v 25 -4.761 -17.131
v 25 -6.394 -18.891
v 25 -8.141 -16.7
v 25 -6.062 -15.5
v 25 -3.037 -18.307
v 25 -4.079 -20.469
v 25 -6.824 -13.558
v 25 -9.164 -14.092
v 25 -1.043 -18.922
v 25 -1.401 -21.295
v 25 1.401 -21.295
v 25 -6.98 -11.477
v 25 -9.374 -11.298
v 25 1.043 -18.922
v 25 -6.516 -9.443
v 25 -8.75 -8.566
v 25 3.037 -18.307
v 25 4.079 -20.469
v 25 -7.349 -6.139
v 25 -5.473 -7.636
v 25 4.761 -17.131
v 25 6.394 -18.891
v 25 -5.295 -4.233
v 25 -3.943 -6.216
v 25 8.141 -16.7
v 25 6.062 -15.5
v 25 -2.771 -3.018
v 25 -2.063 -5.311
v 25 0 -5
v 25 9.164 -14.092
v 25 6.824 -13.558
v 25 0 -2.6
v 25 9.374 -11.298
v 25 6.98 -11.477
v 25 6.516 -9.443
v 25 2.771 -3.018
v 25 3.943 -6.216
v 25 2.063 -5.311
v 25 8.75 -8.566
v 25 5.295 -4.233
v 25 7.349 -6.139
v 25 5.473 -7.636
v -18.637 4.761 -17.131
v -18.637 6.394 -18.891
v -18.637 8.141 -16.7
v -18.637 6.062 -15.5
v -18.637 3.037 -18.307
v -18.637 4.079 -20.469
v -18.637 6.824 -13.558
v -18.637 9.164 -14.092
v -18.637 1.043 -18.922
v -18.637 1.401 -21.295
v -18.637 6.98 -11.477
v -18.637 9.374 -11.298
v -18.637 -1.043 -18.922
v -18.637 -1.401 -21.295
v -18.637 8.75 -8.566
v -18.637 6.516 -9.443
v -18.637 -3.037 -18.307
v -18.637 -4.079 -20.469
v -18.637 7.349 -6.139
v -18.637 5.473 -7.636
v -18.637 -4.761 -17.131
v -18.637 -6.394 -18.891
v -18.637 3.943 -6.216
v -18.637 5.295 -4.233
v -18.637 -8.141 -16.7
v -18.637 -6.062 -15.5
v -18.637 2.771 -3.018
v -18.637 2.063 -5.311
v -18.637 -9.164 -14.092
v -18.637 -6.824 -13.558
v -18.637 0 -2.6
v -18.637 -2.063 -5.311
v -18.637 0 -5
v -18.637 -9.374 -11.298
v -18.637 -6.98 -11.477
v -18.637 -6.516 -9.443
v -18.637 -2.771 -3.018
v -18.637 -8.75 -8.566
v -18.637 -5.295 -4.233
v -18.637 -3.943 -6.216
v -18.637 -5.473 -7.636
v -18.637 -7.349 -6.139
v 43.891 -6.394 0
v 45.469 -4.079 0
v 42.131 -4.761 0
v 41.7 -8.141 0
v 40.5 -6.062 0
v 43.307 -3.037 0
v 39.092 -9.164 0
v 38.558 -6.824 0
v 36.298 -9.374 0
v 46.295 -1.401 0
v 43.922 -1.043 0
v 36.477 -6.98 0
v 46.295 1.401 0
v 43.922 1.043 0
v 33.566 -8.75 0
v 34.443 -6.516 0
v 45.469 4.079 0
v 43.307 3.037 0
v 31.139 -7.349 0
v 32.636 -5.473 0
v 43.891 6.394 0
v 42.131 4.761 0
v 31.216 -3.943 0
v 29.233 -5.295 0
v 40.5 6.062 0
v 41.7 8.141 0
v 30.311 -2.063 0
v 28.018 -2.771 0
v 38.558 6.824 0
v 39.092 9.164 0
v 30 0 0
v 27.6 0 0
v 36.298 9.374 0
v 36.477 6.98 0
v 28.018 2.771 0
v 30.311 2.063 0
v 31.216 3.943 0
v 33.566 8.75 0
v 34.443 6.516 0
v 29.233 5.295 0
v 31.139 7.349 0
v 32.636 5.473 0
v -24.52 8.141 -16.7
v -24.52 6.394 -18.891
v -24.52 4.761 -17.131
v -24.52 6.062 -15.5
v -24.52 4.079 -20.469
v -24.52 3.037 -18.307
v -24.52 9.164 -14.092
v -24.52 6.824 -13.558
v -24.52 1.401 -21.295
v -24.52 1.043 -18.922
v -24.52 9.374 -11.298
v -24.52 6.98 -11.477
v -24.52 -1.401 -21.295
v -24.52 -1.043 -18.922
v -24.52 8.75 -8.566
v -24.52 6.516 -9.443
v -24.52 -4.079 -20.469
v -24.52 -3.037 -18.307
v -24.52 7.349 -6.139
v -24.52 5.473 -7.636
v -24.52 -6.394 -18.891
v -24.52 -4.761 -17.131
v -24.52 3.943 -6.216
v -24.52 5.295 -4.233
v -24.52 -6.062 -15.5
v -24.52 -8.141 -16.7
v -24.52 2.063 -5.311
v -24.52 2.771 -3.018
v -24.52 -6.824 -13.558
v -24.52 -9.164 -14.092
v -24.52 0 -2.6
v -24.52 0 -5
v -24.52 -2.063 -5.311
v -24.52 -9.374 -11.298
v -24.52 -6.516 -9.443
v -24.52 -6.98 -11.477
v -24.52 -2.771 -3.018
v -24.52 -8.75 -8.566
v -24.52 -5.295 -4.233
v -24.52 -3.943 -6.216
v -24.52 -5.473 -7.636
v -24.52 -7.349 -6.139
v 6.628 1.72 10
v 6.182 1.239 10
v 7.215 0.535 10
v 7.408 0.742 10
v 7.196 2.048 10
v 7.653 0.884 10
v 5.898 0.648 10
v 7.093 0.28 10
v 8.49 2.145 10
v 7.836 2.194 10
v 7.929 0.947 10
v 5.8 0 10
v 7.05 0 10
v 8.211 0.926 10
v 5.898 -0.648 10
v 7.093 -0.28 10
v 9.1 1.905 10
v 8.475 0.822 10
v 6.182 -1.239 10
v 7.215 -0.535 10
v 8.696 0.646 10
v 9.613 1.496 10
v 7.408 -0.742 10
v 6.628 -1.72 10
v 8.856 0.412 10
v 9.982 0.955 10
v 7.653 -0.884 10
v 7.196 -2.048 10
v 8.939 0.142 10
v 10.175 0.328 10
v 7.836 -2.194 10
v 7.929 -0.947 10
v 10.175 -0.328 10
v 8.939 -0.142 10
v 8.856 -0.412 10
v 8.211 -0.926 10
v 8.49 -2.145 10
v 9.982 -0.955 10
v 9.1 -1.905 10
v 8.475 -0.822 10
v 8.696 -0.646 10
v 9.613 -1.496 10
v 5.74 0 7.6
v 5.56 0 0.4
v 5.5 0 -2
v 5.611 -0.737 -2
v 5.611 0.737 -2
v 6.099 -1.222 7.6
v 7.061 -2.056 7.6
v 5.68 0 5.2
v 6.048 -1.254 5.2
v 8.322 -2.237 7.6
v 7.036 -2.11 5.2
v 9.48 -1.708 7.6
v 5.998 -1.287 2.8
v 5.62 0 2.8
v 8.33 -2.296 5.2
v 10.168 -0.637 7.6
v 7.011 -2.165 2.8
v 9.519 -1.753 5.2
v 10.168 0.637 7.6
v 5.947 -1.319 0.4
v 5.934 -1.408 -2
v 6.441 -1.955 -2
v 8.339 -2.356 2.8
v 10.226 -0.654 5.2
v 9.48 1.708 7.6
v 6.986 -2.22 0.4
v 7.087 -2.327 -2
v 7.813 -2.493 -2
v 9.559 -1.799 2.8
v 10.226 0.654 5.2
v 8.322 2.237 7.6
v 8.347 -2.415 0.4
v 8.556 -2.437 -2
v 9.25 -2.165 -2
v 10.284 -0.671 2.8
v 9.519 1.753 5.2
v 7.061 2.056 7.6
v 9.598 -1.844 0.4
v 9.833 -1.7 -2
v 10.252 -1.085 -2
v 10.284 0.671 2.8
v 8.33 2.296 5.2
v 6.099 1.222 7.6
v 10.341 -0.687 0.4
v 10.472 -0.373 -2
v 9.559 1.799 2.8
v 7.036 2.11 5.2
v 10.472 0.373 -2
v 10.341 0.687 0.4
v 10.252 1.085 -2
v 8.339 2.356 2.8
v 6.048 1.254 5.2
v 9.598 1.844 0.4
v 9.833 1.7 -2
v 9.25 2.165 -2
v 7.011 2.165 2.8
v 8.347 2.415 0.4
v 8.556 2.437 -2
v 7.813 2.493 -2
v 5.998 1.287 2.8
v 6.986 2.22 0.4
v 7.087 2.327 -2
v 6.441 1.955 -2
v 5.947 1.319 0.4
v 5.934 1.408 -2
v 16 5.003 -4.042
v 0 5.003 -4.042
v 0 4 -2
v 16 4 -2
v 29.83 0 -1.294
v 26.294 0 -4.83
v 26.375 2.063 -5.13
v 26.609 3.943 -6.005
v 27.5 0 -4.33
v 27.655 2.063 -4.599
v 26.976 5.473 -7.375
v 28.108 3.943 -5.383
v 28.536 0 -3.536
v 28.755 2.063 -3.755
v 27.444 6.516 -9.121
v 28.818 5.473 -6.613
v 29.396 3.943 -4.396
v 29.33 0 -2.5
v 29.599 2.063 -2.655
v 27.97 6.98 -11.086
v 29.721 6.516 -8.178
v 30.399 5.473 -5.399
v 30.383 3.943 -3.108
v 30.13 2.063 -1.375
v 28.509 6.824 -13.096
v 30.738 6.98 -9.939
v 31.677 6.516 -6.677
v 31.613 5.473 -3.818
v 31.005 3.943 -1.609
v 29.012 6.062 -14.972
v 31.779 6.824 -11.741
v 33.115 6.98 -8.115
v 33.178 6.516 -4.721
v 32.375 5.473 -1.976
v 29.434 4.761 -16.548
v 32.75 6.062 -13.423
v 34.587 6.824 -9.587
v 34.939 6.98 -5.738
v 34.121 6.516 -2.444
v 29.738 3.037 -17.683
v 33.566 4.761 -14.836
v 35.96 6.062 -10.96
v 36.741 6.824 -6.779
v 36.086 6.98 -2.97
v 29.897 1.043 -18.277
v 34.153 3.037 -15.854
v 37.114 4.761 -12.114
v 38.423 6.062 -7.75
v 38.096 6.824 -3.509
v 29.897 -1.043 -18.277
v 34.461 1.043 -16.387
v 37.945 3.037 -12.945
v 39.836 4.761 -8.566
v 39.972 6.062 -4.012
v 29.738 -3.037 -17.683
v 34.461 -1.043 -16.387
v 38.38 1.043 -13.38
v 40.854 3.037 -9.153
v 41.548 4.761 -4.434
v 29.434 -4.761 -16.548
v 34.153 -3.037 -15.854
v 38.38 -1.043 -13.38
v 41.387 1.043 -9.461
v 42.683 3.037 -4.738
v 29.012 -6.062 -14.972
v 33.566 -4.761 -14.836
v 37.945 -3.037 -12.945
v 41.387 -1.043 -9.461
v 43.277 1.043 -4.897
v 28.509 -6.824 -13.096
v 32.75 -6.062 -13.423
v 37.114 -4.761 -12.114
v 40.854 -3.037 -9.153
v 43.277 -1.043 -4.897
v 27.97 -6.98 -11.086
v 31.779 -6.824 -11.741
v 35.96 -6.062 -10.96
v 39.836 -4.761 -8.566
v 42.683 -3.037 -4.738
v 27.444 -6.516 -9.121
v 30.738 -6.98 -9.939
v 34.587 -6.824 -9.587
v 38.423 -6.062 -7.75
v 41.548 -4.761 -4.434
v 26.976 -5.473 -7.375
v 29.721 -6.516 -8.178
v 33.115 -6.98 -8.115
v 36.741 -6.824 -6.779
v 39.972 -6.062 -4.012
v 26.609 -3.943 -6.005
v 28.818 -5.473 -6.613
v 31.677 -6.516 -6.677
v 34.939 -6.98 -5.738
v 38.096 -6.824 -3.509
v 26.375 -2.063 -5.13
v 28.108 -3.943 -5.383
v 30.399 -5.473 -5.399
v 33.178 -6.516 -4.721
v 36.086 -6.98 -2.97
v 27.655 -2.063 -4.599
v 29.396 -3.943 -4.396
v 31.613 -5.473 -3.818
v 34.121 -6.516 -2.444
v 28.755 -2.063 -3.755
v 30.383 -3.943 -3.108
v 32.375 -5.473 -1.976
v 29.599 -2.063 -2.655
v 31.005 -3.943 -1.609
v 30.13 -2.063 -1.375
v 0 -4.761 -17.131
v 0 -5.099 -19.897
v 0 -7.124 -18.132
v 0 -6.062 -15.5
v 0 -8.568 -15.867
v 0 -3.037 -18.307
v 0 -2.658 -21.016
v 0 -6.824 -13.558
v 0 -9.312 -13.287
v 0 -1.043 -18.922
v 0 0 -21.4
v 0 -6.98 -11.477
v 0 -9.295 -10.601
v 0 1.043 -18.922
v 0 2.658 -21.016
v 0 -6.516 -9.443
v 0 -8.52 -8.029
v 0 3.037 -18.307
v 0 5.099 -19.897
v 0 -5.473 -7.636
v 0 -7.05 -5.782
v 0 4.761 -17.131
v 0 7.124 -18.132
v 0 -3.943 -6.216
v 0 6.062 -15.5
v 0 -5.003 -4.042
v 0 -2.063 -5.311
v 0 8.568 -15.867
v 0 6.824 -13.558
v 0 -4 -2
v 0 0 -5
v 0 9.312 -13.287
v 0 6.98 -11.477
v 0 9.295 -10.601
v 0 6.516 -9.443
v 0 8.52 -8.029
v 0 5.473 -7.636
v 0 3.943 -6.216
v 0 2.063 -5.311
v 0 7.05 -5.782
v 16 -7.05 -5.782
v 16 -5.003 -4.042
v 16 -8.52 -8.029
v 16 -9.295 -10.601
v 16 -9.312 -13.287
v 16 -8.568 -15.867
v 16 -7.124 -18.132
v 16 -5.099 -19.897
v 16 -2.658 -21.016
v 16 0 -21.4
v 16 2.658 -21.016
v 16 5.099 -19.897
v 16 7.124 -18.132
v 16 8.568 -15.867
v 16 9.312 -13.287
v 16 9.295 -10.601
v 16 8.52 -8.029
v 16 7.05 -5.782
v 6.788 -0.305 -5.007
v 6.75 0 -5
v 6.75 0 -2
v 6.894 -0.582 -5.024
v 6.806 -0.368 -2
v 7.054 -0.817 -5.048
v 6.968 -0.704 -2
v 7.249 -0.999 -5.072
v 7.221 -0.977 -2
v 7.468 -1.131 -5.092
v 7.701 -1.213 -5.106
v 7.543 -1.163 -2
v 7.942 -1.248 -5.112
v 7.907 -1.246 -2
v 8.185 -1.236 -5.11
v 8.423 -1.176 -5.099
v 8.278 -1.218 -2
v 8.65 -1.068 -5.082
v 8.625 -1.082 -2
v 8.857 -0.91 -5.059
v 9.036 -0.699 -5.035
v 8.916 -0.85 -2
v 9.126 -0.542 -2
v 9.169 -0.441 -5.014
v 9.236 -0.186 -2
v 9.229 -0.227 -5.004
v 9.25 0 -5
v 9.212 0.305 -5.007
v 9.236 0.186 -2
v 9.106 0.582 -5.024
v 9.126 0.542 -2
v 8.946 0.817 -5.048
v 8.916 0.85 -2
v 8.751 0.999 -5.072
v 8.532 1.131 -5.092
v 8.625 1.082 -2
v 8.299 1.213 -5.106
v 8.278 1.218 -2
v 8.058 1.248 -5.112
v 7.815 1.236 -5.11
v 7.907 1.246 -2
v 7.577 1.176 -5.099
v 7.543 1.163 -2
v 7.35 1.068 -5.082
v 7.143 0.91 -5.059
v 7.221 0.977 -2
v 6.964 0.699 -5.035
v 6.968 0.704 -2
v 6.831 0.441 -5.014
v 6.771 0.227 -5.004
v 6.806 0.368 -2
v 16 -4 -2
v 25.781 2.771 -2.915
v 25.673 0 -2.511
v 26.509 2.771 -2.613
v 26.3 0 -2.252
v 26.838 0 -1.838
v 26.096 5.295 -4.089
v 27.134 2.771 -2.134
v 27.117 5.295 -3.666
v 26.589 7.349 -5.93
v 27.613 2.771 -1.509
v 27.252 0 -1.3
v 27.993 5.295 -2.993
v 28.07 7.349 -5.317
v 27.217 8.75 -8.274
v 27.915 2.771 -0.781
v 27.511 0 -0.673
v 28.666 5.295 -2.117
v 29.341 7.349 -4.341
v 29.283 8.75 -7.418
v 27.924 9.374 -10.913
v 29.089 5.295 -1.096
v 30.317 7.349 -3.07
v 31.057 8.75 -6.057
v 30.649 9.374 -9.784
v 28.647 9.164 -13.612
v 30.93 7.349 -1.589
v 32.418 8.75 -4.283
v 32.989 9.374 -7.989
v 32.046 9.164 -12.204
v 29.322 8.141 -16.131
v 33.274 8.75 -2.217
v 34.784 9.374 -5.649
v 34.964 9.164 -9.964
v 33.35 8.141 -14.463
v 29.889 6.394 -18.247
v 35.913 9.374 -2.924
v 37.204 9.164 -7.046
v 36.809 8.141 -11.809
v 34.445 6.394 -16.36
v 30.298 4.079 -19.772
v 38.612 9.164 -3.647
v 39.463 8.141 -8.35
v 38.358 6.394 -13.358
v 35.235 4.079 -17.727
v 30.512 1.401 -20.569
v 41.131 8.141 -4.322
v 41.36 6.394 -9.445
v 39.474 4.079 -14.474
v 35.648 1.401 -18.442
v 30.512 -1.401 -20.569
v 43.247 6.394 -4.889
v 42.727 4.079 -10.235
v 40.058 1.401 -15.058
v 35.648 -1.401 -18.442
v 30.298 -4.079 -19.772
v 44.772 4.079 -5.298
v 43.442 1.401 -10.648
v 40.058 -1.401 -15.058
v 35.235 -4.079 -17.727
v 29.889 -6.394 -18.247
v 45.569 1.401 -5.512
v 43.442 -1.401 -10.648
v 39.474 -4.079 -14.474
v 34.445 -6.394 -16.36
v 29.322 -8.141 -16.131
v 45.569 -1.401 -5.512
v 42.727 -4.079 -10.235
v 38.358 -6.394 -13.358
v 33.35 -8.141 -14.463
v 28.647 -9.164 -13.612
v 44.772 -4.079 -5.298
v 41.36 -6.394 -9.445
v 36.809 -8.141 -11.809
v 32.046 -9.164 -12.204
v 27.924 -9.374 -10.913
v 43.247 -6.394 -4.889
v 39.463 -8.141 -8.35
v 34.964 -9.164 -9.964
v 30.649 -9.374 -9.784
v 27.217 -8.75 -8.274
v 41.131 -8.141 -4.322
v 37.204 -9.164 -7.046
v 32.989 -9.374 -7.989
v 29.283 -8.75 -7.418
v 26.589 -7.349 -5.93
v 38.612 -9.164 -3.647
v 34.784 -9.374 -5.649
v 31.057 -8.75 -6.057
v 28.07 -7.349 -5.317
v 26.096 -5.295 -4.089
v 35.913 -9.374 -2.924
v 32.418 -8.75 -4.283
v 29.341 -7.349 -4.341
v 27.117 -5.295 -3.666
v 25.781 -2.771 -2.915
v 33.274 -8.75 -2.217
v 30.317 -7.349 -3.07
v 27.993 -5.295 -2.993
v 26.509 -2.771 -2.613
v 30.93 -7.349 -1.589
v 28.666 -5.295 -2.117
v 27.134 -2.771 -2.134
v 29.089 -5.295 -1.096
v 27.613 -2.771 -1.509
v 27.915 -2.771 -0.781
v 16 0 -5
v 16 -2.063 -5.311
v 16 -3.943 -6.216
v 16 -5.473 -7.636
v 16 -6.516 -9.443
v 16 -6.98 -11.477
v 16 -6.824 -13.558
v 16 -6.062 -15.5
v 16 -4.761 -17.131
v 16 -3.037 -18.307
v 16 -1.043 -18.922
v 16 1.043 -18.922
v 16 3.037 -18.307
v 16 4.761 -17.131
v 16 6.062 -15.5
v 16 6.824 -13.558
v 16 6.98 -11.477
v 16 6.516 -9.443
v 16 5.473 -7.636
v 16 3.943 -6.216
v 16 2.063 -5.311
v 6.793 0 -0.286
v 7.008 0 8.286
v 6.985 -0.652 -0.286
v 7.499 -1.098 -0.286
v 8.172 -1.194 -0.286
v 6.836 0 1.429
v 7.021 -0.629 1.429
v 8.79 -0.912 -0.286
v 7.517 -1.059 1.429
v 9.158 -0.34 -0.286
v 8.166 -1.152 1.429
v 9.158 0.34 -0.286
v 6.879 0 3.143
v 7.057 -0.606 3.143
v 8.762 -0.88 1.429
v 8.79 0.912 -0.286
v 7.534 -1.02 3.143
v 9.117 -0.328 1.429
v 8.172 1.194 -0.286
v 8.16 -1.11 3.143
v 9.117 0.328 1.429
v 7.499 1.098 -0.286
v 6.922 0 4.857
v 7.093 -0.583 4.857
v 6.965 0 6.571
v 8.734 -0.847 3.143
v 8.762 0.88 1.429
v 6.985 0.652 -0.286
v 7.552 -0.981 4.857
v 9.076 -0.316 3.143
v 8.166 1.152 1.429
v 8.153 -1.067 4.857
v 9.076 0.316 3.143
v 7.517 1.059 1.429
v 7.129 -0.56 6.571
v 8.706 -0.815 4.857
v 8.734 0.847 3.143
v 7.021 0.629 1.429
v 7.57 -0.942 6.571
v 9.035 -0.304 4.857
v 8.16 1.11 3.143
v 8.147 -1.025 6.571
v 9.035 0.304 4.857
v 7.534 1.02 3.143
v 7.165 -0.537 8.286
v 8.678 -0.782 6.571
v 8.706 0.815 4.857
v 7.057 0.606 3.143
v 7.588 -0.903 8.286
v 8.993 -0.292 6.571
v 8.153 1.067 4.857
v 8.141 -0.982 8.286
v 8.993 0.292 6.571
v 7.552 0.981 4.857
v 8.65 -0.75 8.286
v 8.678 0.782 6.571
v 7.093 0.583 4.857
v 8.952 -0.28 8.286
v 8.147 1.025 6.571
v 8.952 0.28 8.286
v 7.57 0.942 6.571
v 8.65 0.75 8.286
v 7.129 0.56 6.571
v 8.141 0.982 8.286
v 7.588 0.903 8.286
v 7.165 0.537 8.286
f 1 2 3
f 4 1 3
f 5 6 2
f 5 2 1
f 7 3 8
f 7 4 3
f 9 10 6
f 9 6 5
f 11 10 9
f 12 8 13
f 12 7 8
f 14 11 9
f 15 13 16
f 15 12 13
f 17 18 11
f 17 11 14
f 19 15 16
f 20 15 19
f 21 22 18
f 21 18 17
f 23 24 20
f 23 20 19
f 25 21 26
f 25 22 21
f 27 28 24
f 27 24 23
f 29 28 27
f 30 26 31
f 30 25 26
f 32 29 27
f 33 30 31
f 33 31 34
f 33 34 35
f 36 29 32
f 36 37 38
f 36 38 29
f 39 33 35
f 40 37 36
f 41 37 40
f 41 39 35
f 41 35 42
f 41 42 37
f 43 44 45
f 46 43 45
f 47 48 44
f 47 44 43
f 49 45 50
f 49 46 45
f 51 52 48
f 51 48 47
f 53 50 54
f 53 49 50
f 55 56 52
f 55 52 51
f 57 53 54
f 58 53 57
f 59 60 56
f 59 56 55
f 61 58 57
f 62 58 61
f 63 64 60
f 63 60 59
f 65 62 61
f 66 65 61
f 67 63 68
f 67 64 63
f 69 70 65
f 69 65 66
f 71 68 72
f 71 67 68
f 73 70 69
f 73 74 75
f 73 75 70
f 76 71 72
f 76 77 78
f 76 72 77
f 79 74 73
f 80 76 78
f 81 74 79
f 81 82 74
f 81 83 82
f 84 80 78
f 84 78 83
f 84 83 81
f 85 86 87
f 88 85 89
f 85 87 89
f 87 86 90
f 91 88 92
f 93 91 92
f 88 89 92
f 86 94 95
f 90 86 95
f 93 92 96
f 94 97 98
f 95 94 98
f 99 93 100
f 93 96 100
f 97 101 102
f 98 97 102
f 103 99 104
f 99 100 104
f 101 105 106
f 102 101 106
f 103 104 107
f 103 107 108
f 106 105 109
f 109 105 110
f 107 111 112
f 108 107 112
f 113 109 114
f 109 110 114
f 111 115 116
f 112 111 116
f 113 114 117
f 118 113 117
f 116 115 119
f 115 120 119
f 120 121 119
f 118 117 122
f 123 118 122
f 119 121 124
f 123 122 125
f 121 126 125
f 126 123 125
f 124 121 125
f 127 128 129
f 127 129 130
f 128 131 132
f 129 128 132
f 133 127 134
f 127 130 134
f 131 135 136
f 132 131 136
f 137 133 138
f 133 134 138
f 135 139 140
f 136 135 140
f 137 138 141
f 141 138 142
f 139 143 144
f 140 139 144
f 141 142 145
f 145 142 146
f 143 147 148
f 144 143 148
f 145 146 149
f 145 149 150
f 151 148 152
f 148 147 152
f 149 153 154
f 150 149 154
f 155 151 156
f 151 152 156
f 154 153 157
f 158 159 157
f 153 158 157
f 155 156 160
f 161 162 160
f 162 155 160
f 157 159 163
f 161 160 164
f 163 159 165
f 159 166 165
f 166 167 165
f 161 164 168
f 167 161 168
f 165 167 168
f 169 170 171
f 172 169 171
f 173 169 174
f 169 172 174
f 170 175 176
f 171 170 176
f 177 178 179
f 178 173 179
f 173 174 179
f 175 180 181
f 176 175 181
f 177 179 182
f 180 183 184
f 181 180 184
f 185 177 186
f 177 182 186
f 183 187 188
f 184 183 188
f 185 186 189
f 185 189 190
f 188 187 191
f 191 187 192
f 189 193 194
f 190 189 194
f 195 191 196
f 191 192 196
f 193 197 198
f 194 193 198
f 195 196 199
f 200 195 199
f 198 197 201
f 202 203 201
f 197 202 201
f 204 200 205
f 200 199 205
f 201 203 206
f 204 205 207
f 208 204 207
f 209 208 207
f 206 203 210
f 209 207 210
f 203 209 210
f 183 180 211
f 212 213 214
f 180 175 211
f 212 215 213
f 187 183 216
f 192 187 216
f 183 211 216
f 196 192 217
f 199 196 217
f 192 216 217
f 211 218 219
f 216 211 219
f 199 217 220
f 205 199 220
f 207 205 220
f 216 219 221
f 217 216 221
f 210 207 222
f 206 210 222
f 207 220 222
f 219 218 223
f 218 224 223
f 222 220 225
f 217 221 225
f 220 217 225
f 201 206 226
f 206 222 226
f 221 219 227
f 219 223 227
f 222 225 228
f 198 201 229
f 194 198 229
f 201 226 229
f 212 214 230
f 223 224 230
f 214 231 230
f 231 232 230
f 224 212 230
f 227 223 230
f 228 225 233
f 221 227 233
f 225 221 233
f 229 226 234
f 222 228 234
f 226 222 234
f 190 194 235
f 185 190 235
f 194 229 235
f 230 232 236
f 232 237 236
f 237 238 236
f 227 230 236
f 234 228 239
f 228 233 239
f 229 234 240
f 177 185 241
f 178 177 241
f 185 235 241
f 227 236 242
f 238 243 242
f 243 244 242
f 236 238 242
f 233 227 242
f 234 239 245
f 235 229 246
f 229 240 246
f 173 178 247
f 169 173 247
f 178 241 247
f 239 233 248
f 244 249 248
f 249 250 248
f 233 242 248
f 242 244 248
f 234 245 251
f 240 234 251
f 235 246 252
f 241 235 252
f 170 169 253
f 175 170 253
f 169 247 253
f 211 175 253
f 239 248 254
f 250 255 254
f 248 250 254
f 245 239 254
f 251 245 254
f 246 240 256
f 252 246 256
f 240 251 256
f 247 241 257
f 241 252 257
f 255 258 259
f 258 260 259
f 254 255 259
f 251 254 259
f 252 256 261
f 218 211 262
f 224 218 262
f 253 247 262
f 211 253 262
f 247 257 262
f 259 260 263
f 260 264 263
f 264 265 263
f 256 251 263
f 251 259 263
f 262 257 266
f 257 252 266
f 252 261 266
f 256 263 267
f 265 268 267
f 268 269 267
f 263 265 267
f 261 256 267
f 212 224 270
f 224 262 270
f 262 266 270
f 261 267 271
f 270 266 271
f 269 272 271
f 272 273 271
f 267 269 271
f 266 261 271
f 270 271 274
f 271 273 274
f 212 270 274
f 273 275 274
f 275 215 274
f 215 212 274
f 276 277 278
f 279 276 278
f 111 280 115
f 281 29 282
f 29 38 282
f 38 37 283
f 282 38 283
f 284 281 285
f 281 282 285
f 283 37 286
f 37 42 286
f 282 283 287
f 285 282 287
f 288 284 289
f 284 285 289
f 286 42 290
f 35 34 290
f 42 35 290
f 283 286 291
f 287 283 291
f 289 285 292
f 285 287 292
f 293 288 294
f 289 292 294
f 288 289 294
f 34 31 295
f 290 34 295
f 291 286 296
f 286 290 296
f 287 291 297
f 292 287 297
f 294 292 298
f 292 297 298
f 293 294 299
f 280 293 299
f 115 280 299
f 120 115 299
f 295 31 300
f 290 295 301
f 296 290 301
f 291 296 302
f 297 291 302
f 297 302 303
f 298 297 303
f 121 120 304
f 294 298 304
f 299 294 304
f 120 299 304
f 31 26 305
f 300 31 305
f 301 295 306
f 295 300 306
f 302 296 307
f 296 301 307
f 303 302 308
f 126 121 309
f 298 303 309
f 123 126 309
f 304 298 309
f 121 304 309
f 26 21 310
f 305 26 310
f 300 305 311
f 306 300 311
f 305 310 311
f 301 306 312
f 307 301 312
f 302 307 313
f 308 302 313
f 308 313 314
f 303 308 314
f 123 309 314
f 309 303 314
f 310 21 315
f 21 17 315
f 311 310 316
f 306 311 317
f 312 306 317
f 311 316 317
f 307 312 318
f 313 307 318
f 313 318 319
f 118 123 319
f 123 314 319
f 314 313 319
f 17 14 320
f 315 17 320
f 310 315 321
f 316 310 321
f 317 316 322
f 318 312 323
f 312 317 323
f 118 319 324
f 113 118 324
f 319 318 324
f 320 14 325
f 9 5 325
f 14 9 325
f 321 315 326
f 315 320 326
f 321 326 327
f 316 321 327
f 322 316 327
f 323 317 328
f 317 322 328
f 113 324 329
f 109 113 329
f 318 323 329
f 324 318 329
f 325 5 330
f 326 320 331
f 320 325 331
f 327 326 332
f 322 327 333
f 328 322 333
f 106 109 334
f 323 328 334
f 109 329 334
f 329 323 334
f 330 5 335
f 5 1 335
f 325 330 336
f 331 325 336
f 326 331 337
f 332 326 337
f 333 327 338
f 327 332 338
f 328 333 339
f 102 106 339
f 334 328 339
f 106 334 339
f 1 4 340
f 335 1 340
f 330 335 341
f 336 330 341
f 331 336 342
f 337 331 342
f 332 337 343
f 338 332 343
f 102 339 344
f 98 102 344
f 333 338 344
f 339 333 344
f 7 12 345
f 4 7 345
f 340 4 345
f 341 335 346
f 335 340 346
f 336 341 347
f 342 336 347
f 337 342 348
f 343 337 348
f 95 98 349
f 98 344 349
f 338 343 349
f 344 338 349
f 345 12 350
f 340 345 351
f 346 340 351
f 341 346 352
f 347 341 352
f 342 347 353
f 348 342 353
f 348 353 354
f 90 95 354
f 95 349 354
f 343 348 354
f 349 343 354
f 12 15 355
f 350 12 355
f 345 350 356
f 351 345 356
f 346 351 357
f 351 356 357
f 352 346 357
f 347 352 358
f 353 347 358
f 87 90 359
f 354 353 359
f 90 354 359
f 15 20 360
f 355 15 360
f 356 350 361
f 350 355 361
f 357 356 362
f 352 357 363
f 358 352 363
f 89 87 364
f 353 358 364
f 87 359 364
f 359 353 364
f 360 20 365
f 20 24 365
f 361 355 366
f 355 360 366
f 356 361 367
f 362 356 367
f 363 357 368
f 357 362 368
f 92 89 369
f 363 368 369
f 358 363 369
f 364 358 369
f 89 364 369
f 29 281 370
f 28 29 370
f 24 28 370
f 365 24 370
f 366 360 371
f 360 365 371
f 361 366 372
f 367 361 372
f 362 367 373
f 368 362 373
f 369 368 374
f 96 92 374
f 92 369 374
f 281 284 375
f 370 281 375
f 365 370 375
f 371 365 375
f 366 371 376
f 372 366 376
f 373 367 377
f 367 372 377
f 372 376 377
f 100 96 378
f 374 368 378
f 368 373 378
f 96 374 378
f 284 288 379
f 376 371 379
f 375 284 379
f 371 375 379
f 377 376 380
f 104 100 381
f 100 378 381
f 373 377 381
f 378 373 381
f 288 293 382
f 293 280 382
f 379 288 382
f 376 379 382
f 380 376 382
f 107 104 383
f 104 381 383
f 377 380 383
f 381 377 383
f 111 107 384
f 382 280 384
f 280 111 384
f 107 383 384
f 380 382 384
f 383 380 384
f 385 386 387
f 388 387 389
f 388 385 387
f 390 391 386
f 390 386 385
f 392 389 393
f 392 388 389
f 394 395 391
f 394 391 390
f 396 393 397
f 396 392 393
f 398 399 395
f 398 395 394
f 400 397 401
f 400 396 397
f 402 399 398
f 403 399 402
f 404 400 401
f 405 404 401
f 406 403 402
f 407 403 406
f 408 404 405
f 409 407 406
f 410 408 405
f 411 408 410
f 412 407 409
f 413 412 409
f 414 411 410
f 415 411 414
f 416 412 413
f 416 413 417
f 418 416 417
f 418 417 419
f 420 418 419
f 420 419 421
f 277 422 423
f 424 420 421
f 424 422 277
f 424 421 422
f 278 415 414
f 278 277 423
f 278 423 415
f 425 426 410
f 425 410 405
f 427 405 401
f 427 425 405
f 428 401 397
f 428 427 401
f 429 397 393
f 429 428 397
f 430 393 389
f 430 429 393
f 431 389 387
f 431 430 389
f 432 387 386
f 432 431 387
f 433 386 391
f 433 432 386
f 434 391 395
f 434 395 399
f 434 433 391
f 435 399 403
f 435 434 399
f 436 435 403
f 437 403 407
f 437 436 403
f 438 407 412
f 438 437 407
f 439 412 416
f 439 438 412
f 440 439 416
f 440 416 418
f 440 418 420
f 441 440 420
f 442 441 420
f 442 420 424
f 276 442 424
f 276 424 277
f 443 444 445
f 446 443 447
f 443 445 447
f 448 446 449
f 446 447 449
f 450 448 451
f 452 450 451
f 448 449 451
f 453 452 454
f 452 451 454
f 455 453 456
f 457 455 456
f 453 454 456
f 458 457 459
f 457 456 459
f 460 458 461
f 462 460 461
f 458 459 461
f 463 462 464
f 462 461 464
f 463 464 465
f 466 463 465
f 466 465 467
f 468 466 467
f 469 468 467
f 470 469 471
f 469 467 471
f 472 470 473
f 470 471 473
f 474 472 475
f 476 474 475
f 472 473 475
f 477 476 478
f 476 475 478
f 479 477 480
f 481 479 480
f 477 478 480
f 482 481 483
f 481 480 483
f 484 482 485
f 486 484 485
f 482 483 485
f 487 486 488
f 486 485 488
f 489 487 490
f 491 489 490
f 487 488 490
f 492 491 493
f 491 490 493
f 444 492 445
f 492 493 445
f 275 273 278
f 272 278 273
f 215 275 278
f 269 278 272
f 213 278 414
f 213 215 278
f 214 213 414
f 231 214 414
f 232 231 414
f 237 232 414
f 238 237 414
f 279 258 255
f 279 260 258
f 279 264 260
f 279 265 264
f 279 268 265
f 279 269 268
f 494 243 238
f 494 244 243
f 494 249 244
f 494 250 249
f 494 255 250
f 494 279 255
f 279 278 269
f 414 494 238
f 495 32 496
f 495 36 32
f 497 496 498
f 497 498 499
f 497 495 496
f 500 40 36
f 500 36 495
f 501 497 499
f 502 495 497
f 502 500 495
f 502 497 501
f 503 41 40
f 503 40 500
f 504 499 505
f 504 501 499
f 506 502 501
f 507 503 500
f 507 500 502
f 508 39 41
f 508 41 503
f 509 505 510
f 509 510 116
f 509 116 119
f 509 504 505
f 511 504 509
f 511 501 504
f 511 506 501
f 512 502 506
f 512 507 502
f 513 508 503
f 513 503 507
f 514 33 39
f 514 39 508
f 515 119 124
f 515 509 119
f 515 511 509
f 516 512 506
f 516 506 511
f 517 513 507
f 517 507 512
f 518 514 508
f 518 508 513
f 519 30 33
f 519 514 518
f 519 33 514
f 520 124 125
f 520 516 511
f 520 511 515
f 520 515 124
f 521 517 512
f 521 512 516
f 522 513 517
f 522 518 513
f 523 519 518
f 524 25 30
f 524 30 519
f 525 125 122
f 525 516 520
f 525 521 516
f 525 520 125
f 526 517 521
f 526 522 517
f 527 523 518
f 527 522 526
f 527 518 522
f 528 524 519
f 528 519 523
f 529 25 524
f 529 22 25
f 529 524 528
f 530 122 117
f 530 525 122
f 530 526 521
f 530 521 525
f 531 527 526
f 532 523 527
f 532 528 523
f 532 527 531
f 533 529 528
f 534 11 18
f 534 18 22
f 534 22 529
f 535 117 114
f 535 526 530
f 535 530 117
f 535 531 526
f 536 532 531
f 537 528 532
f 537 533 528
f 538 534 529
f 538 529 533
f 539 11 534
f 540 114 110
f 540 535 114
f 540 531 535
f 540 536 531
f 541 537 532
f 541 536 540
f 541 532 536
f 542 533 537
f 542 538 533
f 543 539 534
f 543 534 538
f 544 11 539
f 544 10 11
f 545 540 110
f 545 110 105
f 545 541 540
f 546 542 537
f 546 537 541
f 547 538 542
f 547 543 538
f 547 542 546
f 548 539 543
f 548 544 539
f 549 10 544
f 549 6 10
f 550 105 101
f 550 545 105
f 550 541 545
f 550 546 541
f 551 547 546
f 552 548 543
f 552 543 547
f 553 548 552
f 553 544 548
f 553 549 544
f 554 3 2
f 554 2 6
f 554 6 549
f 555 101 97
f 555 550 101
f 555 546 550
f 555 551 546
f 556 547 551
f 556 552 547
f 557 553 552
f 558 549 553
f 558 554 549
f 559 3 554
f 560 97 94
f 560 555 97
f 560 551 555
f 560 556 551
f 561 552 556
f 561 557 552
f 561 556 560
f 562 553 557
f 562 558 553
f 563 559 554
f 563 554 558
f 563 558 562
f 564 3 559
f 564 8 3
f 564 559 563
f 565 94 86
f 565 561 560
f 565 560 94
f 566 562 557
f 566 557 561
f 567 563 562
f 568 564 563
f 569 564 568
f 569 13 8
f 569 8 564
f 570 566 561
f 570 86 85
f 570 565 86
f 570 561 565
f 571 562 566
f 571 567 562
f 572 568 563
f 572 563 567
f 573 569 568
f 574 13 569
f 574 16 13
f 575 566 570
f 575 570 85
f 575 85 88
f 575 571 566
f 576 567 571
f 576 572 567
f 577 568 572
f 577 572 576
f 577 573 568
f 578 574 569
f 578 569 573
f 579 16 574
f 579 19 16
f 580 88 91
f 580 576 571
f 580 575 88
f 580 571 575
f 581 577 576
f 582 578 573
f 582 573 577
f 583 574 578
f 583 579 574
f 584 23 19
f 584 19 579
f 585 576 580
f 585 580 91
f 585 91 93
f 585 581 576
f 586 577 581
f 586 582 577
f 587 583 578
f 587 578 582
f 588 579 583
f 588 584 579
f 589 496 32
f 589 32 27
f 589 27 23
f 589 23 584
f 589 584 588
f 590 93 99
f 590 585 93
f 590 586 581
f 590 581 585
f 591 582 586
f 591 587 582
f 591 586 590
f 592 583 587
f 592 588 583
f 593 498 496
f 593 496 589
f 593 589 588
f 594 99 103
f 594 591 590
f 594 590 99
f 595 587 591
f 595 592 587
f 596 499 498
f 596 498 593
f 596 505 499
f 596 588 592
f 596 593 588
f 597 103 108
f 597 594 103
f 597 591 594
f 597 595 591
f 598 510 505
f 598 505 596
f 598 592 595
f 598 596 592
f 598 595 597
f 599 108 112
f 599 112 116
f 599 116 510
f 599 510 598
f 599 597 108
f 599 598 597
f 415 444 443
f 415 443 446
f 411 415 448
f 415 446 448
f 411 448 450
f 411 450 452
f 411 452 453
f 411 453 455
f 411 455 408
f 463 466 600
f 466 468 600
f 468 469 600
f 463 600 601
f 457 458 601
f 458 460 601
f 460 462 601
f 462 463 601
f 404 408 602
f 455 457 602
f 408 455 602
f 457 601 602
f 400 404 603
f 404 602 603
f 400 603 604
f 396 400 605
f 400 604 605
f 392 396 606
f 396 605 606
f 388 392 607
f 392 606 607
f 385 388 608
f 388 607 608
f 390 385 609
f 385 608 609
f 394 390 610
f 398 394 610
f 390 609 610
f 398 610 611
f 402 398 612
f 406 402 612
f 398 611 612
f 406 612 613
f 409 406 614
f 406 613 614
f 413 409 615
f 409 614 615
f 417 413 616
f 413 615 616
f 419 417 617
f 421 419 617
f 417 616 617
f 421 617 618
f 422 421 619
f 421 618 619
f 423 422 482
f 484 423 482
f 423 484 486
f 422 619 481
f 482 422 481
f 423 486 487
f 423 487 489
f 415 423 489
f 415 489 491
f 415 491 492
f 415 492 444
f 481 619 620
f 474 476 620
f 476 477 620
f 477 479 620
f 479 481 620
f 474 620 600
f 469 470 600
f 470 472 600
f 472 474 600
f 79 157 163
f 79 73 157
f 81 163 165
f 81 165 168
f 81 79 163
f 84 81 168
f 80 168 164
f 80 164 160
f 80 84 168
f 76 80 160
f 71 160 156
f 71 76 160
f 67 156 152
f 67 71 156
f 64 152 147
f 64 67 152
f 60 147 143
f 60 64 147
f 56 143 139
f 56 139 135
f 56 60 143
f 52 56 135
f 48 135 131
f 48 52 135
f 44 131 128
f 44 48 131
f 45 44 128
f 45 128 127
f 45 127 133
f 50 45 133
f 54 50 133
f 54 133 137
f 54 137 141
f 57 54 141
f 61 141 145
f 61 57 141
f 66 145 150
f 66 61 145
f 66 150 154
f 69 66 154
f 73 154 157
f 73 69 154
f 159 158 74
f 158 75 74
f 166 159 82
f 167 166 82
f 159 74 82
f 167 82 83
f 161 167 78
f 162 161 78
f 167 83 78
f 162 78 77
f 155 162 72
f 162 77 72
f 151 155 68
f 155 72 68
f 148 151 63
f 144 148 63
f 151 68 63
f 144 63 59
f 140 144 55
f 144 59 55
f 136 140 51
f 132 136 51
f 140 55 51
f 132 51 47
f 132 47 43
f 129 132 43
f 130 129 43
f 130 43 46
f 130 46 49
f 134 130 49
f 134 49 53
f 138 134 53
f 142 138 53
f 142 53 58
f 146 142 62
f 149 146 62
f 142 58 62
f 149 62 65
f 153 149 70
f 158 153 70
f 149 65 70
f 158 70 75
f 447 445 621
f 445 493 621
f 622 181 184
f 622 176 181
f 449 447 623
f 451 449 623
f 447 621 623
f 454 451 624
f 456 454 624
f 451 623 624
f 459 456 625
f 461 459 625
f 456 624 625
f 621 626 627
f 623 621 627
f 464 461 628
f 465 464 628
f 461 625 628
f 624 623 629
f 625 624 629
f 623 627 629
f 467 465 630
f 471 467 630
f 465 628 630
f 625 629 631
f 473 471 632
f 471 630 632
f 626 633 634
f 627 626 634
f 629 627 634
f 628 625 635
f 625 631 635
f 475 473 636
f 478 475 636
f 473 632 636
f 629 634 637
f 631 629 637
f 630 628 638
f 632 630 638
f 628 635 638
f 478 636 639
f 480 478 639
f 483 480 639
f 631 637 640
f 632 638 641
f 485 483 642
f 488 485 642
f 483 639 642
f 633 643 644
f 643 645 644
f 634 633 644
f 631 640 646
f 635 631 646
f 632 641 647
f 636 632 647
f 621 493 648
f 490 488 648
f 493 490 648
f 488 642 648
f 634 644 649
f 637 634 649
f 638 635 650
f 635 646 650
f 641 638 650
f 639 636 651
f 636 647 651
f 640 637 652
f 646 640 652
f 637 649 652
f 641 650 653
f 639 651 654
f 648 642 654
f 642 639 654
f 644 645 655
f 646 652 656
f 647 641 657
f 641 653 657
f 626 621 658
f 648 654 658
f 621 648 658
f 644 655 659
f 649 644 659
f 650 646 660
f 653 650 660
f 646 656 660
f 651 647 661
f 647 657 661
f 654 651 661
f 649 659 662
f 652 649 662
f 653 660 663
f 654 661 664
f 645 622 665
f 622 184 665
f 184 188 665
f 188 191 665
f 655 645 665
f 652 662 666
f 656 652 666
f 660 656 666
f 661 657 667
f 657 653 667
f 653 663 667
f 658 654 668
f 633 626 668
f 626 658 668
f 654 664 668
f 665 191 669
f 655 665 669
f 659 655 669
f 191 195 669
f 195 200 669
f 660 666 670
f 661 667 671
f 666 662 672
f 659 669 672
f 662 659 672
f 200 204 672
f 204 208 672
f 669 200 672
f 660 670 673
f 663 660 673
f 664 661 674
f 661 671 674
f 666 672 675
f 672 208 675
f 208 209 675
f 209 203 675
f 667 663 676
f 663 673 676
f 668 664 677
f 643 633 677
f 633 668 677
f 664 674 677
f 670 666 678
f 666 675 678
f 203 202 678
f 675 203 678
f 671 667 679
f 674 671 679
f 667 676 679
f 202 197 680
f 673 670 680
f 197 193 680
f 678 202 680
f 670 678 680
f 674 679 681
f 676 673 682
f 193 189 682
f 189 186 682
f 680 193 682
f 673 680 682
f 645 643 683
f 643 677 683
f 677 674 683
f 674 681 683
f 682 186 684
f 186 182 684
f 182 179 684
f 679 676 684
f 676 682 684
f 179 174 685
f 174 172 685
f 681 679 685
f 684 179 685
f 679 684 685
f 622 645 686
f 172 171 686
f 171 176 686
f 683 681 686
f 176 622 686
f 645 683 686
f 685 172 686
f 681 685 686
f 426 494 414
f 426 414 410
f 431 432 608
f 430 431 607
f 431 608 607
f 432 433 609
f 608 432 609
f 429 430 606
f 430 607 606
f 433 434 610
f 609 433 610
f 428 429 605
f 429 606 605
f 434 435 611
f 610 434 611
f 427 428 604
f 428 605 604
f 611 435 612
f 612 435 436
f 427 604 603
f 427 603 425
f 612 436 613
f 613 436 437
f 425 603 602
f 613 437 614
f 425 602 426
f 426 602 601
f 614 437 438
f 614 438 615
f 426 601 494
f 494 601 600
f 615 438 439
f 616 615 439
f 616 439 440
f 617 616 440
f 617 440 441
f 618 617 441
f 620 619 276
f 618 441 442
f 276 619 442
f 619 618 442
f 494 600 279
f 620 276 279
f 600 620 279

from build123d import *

# Parameters (mm, degrees)
F1_R     = 9.4
F1_R_2   = 7
F4_DEPTH = 18.3
F5_W     = 1.249609436
F5_H     = 10
F8_W     = 16
F8_H     = 46.3908466514
F8_W_2   = 23.1704358011
F8_H_2   = 47.9381382465
F8_W_3   = 5.8829372283
F8_H_3   = 50.1003395766
F9_DEPTH = 12.5


with BuildPart() as f2:
    # F2: sweep along a path in F0
    with BuildLine(Plane.XZ) as f2_path:
        ThreePointArc((-37, 0), (-33.4852813742, -8.4852813742), (-25, -12))
        Line((-25, -12), (25, -12))
        ThreePointArc((25, -12), (33.4852813742, -8.4852813742), (37, 0))
    # F1 (on Top) → F2 (sweep)
    with BuildSketch(Plane.XY):
        with Locations((-37, 0)):
            Circle(F1_R)
        with Locations((-37, 0)):
            Circle(F1_R_2, mode=Mode.SUBTRACT)
    sweep(path=f2_path.line)

    # F3 (on Right) → F4 (join, symmetric)
    with BuildSketch(Plane.YZ):
        with BuildLine():
            ThreePointArc((-7.1800707248, -8.4720282899), (0, -4), (7.1800707248, -8.4720282899))
            Line((7.1800707248, -8.4720282899), (4, -2))
            Line((4, -2), (0, -2))
            Line((0, -2), (-4, -2))
            Line((-4, -2), (-7.1800707248, -8.4720282899))
        make_face()
    extrude(amount=F4_DEPTH, both=True)

    # F5 (on Front) → F6 (revolve)
    with BuildSketch(Plane.XZ):
        Polygon((5.8, 10), (5.5, -2), (6.750390564, -2), (7.050390564, 10), align=None)
    revolve(axis=Axis((8, 0, 4), (0, 0, 1)))

    # F5 (on Front) → F7 (revolve, cut)
    with BuildSketch(Plane.XZ):
        with Locations((7.375195282, -7)):
            Rectangle(F5_W, F5_H)
    revolve(axis=Axis((8, 0, 4), (0, 0, 1)), mode=Mode.SUBTRACT)

    # F8 (on Front) → F9 (intersect, symmetric)
    with BuildSketch(Plane.XZ):
        with Locations((8, -5.7285078005)):
            Rectangle(F8_W, F8_H)
        with Locations((36.5852179006, -6.5048970282)):
            Rectangle(F8_W_2, F8_H_2)
        with Locations((-21.5789416106, -7.3923291638)):
            Rectangle(F8_W_3, F8_H_3)
    extrude(amount=F9_DEPTH, both=True, mode=Mode.INTERSECT)


solid = f2.part
